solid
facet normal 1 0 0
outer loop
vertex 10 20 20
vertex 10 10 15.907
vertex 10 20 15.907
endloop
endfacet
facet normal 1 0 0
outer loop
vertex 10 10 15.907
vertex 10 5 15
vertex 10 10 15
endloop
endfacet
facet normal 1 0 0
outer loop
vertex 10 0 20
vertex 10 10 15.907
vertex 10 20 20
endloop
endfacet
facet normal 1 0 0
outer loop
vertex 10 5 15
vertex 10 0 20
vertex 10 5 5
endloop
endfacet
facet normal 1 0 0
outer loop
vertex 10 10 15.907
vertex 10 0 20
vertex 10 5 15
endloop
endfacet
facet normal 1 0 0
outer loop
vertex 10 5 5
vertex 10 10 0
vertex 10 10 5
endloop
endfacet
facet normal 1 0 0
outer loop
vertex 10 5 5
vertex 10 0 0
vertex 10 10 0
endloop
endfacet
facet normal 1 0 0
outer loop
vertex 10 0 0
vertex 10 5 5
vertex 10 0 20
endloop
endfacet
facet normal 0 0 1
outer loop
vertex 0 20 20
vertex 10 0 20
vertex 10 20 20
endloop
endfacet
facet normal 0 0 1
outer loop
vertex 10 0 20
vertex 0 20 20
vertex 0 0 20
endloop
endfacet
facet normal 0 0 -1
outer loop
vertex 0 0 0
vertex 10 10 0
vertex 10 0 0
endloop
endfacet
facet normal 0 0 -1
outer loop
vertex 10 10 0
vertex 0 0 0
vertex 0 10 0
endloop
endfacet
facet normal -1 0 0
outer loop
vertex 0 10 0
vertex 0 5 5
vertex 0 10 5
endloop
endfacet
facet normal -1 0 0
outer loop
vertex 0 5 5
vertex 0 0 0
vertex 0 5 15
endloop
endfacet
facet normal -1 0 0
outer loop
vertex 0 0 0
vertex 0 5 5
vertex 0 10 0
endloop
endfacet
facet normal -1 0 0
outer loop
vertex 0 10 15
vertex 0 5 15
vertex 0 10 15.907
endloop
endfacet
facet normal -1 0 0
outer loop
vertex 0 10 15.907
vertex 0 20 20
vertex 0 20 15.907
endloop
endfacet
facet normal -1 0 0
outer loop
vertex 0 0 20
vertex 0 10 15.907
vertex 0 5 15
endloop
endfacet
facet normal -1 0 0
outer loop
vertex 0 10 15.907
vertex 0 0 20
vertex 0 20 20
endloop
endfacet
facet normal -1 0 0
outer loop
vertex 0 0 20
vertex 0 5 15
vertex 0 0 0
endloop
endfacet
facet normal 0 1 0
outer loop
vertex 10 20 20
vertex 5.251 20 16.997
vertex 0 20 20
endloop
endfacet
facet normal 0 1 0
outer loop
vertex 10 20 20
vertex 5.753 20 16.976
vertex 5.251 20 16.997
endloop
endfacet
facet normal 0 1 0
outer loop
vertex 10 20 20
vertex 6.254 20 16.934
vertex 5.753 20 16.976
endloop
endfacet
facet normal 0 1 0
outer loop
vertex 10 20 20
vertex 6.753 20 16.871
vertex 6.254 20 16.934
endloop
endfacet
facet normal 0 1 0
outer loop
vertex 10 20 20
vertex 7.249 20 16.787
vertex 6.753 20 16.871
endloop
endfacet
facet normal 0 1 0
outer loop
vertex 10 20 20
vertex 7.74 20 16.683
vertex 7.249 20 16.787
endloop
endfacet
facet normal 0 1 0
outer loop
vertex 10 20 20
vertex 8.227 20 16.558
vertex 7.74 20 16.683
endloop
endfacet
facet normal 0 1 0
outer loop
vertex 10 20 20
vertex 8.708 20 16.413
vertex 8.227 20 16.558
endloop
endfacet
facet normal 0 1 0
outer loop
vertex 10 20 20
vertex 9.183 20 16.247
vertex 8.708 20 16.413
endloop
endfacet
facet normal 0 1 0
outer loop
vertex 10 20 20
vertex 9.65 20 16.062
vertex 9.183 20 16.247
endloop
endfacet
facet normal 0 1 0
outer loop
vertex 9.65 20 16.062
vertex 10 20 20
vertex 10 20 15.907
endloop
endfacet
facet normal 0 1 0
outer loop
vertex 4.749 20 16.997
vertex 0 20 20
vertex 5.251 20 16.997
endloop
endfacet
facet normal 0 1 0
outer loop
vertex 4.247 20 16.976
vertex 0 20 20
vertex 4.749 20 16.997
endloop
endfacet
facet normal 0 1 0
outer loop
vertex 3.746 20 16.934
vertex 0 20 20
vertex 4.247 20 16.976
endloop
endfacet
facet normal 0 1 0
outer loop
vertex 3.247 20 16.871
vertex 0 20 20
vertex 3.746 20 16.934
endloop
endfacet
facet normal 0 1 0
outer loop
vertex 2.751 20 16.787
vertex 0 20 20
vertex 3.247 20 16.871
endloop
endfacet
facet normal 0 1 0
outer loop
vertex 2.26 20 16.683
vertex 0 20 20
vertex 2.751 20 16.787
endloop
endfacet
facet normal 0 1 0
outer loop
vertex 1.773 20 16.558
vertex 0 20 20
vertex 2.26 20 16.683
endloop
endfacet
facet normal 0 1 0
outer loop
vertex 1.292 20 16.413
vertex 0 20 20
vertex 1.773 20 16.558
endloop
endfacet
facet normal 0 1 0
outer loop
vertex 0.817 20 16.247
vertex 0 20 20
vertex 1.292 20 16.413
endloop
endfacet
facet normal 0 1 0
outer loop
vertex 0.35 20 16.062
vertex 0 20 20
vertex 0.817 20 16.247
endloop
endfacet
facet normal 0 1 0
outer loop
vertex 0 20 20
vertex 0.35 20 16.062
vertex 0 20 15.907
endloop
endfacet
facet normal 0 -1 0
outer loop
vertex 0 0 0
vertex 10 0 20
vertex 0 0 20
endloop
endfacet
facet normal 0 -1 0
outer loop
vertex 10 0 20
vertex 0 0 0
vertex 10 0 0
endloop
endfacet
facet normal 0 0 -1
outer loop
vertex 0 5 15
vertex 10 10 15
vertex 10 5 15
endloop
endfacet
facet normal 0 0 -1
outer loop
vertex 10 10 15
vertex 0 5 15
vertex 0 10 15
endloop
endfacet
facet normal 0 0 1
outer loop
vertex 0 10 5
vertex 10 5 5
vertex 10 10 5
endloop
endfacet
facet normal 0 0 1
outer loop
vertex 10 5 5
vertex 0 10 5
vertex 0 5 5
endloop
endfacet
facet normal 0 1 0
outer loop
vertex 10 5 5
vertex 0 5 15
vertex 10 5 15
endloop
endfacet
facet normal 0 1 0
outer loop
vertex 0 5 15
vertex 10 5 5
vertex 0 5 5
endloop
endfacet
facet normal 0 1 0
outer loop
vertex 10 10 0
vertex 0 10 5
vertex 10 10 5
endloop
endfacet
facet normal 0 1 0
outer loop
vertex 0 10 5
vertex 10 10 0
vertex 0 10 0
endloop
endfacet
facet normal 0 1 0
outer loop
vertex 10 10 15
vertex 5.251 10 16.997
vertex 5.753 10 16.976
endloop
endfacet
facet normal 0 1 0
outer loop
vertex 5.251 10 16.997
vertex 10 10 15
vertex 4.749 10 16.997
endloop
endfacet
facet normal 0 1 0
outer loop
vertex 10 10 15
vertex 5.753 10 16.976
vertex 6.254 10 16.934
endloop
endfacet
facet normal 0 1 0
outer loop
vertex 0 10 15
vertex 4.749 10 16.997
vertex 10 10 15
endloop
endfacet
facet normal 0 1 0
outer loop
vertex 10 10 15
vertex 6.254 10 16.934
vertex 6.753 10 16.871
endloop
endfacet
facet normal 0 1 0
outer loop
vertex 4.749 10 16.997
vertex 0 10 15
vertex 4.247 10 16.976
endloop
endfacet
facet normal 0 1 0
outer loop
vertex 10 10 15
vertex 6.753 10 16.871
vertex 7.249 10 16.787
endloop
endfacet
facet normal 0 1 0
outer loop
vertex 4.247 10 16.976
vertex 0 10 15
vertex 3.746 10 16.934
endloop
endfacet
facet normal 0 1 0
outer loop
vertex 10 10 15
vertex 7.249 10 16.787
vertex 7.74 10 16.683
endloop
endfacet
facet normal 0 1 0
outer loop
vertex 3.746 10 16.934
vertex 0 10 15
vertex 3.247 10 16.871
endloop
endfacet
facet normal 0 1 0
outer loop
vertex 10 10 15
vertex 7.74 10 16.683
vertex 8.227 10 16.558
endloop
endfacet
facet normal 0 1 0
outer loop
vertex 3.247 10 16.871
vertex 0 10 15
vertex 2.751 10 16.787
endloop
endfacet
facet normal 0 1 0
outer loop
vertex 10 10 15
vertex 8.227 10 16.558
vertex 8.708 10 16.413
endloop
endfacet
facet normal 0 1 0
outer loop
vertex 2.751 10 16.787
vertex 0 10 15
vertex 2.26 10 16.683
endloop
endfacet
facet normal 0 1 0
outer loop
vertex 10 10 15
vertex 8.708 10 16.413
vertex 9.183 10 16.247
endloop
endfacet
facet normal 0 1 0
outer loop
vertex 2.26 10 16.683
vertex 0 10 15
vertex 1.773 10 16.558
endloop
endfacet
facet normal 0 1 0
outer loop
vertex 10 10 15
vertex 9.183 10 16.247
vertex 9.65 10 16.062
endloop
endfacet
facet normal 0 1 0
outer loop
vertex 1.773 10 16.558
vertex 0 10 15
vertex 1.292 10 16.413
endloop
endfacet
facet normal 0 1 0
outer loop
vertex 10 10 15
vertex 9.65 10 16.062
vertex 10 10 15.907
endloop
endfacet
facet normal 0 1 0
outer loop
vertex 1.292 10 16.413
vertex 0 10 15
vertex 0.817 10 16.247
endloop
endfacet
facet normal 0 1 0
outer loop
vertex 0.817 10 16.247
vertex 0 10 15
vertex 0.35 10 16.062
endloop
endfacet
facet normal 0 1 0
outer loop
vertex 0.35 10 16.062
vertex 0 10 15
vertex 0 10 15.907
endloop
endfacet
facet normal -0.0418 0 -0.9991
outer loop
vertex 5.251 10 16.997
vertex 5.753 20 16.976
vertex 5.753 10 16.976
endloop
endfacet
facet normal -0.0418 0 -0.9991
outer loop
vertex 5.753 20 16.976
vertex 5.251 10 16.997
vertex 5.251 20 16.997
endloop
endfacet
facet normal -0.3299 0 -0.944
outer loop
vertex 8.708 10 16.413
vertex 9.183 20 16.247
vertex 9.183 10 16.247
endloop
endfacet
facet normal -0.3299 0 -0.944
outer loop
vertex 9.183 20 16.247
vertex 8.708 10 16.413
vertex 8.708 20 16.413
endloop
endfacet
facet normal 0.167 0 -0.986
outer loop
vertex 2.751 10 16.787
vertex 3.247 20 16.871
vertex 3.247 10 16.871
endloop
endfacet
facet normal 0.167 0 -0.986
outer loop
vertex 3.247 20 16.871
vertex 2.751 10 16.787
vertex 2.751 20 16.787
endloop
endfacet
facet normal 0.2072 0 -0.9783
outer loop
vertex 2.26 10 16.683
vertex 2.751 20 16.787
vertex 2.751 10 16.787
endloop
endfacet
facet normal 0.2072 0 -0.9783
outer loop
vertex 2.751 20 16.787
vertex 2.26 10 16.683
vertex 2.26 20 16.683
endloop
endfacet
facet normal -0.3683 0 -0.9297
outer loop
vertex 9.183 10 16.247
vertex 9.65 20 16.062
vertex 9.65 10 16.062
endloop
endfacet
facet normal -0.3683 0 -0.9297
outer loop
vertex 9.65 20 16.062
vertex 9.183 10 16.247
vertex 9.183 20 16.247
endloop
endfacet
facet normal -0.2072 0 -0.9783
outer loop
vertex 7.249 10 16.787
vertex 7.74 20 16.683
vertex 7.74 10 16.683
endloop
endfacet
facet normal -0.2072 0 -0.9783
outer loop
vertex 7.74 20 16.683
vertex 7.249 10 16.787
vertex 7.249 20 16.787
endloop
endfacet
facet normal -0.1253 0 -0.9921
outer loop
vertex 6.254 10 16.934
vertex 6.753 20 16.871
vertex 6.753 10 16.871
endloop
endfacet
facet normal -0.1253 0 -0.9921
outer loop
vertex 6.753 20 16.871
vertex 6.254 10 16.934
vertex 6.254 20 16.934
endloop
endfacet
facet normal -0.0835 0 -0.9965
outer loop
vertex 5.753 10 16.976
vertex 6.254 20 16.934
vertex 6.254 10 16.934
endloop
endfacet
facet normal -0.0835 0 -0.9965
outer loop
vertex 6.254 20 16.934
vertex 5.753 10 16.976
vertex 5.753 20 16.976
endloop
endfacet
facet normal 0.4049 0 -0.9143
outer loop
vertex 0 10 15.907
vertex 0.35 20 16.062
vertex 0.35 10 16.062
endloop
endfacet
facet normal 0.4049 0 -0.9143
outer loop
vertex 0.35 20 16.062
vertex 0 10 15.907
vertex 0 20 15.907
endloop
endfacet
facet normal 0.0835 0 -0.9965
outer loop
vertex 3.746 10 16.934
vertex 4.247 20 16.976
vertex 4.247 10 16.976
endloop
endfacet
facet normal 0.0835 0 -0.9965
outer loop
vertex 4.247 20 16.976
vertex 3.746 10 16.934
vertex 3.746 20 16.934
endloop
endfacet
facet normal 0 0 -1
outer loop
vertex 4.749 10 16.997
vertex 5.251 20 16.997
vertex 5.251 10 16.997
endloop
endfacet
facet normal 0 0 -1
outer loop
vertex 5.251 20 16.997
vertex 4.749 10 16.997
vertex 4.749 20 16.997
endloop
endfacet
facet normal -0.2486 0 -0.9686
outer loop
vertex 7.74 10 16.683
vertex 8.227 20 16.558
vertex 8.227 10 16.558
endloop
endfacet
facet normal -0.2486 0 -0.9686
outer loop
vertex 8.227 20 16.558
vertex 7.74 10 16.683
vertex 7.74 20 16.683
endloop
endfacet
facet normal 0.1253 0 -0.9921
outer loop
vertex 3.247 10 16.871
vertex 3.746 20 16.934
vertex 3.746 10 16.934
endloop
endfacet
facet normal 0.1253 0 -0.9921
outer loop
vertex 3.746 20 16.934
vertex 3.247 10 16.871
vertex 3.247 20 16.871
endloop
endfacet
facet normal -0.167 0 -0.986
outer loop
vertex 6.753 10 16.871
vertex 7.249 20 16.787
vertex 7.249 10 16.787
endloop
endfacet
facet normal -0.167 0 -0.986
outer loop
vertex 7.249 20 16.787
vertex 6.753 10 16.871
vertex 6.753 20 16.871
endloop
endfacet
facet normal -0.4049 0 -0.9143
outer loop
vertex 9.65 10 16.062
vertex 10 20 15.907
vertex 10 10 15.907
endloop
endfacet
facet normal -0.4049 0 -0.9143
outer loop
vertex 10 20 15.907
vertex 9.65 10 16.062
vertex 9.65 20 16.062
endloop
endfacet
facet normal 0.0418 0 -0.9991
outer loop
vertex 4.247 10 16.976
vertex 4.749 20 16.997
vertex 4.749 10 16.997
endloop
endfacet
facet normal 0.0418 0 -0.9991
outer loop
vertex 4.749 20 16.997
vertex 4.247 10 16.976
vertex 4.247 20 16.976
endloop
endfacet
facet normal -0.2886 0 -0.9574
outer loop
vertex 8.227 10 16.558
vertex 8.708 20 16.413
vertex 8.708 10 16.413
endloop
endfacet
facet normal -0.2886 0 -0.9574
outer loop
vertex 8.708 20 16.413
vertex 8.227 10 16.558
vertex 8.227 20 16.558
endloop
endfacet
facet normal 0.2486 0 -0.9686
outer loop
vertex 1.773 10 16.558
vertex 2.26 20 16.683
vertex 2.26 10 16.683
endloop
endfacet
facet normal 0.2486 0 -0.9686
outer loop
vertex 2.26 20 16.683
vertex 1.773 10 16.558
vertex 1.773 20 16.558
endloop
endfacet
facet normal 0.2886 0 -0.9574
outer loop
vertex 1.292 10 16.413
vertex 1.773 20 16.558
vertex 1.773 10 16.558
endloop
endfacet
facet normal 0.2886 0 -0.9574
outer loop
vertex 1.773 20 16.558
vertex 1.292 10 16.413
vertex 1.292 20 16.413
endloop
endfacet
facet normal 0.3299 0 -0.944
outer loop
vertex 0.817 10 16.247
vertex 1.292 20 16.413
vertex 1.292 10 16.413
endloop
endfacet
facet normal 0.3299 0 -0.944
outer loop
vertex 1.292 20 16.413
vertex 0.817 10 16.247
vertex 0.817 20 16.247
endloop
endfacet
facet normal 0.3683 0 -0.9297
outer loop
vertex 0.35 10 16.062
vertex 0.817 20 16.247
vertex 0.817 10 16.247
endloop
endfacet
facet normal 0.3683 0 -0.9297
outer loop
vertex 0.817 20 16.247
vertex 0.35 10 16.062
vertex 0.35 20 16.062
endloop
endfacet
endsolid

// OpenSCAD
$fn = 150;
difference(){
	cube([10,20,20]);
	translate([0,5,5]) cube([20, 20,10]);
	translate([0,10,0]) cube([20, 20,15]);
	translate([5, 10, 5]) rotate([-90,0,0]) cylinder(h=20, r=12);
}
